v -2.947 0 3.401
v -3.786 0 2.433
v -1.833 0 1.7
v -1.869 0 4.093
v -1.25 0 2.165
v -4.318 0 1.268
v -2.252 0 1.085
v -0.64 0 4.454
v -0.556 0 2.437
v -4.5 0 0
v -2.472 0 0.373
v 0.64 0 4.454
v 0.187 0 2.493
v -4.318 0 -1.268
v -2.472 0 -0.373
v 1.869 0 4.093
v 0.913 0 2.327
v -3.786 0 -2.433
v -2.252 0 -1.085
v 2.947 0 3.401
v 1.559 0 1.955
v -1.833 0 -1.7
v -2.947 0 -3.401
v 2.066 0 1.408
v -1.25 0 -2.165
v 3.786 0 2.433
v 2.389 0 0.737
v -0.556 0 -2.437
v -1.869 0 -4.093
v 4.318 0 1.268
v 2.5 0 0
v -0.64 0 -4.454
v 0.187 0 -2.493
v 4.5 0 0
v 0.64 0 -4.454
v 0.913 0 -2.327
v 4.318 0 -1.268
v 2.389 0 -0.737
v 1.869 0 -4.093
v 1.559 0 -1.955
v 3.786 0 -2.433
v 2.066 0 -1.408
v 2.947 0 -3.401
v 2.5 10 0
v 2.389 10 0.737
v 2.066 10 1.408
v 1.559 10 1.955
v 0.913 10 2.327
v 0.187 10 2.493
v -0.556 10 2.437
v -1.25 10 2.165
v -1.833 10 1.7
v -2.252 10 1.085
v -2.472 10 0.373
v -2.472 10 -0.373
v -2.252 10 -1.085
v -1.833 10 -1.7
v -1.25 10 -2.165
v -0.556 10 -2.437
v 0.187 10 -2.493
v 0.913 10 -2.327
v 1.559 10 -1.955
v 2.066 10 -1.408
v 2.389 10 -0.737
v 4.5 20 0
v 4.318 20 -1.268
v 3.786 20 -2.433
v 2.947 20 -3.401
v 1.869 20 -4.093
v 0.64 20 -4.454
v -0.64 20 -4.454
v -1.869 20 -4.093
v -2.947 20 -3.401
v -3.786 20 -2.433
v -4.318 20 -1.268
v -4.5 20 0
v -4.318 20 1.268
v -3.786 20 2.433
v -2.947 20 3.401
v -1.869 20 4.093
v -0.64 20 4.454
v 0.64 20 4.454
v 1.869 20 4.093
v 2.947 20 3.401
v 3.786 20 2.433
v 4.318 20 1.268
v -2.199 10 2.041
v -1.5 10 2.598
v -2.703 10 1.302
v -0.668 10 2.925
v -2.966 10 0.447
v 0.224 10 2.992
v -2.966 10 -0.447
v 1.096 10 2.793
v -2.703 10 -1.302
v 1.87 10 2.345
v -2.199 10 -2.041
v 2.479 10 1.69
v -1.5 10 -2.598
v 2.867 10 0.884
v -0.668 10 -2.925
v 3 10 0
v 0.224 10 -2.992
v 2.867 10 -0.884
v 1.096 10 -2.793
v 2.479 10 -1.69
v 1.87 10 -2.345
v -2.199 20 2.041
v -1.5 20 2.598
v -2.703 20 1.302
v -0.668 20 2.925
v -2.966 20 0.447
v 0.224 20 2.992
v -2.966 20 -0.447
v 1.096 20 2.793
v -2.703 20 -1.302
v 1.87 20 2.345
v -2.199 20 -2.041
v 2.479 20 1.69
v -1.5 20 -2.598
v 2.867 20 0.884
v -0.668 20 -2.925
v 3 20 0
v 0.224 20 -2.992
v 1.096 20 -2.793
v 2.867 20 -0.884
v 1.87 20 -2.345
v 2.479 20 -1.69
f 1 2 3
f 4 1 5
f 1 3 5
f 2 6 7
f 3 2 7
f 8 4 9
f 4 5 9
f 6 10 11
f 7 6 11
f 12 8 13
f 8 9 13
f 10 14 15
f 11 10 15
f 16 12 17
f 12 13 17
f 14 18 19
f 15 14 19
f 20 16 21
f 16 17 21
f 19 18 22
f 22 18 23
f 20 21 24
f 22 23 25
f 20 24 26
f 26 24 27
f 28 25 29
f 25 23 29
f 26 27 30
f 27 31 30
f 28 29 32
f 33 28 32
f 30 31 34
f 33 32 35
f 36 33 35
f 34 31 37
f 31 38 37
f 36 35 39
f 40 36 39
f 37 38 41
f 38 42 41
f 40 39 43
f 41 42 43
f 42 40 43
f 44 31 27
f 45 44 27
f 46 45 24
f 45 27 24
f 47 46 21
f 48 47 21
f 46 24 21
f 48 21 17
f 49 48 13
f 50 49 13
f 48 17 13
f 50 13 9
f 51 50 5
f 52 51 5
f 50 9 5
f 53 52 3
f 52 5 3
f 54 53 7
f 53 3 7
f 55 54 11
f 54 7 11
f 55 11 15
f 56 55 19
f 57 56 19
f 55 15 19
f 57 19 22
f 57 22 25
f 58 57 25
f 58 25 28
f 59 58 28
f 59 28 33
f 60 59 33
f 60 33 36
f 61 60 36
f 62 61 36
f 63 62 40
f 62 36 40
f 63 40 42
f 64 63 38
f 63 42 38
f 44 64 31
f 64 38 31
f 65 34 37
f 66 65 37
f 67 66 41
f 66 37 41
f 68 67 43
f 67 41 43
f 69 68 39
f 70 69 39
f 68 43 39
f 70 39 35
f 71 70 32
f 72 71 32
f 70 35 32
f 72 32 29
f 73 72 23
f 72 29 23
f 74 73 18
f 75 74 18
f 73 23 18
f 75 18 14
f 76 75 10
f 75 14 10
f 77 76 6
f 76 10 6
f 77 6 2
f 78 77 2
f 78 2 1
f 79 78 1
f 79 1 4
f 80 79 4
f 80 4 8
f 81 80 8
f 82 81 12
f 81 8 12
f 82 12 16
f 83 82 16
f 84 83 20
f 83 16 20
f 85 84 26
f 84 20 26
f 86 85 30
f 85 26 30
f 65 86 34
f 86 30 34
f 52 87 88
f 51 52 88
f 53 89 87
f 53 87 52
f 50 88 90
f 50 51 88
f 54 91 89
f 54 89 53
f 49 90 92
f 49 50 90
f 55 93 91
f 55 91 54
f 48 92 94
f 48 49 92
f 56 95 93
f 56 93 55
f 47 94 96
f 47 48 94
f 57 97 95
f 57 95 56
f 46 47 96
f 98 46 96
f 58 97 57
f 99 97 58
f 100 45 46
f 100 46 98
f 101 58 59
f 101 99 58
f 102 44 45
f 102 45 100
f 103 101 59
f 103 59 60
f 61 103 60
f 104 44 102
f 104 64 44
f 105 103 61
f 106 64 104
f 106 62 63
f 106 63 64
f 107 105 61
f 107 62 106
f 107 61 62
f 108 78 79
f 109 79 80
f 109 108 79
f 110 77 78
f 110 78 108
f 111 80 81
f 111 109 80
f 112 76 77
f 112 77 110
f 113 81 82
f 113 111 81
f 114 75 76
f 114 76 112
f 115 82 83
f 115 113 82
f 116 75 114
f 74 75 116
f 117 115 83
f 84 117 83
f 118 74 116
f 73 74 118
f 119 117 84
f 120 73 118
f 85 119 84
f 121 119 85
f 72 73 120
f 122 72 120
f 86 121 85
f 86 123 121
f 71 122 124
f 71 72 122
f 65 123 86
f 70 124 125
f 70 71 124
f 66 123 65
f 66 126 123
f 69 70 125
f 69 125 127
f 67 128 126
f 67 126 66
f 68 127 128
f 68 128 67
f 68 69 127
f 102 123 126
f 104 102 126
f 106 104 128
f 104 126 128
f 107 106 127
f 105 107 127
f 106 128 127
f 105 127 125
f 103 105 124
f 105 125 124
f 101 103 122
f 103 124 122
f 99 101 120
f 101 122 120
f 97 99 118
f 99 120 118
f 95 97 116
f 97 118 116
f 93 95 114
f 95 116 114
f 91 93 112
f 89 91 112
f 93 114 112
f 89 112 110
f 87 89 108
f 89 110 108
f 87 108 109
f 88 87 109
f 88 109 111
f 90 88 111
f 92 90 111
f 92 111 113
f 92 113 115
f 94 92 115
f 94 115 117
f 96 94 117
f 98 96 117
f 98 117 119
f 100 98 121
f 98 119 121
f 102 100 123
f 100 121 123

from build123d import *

# Parameters (mm, degrees)
SKETCH2_R           = 4.5
BOSS_EXTRUDE1_DEPTH = 20
SKETCH3_R           = 3
CUT_EXTRUDE1_DEPTH  = 10
SKETCH4_R           = 2.5
CUT_EXTRUDE2_DEPTH  = 10


with BuildPart() as part:
    # Sketch2 → Boss-Extrude1 (new body)
    with BuildSketch(Plane(origin=(0, 0, 0), x_dir=(1, 0, 0), z_dir=(0, 1, 0))):
        Circle(SKETCH2_R)
    extrude(amount=BOSS_EXTRUDE1_DEPTH)

    # Sketch3 → Cut-Extrude1 (cut)
    with BuildSketch(Plane(origin=(0, 20, 0), x_dir=(1, 0, 0), z_dir=(0, 1, 0))):
        Circle(SKETCH3_R)
    extrude(amount=-CUT_EXTRUDE1_DEPTH, mode=Mode.SUBTRACT)

    # Sketch4 → Cut-Extrude2 (cut)
    with BuildSketch(Plane.XZ):
        Circle(SKETCH4_R)
    extrude(amount=-CUT_EXTRUDE2_DEPTH, mode=Mode.SUBTRACT)


solid = part.part
